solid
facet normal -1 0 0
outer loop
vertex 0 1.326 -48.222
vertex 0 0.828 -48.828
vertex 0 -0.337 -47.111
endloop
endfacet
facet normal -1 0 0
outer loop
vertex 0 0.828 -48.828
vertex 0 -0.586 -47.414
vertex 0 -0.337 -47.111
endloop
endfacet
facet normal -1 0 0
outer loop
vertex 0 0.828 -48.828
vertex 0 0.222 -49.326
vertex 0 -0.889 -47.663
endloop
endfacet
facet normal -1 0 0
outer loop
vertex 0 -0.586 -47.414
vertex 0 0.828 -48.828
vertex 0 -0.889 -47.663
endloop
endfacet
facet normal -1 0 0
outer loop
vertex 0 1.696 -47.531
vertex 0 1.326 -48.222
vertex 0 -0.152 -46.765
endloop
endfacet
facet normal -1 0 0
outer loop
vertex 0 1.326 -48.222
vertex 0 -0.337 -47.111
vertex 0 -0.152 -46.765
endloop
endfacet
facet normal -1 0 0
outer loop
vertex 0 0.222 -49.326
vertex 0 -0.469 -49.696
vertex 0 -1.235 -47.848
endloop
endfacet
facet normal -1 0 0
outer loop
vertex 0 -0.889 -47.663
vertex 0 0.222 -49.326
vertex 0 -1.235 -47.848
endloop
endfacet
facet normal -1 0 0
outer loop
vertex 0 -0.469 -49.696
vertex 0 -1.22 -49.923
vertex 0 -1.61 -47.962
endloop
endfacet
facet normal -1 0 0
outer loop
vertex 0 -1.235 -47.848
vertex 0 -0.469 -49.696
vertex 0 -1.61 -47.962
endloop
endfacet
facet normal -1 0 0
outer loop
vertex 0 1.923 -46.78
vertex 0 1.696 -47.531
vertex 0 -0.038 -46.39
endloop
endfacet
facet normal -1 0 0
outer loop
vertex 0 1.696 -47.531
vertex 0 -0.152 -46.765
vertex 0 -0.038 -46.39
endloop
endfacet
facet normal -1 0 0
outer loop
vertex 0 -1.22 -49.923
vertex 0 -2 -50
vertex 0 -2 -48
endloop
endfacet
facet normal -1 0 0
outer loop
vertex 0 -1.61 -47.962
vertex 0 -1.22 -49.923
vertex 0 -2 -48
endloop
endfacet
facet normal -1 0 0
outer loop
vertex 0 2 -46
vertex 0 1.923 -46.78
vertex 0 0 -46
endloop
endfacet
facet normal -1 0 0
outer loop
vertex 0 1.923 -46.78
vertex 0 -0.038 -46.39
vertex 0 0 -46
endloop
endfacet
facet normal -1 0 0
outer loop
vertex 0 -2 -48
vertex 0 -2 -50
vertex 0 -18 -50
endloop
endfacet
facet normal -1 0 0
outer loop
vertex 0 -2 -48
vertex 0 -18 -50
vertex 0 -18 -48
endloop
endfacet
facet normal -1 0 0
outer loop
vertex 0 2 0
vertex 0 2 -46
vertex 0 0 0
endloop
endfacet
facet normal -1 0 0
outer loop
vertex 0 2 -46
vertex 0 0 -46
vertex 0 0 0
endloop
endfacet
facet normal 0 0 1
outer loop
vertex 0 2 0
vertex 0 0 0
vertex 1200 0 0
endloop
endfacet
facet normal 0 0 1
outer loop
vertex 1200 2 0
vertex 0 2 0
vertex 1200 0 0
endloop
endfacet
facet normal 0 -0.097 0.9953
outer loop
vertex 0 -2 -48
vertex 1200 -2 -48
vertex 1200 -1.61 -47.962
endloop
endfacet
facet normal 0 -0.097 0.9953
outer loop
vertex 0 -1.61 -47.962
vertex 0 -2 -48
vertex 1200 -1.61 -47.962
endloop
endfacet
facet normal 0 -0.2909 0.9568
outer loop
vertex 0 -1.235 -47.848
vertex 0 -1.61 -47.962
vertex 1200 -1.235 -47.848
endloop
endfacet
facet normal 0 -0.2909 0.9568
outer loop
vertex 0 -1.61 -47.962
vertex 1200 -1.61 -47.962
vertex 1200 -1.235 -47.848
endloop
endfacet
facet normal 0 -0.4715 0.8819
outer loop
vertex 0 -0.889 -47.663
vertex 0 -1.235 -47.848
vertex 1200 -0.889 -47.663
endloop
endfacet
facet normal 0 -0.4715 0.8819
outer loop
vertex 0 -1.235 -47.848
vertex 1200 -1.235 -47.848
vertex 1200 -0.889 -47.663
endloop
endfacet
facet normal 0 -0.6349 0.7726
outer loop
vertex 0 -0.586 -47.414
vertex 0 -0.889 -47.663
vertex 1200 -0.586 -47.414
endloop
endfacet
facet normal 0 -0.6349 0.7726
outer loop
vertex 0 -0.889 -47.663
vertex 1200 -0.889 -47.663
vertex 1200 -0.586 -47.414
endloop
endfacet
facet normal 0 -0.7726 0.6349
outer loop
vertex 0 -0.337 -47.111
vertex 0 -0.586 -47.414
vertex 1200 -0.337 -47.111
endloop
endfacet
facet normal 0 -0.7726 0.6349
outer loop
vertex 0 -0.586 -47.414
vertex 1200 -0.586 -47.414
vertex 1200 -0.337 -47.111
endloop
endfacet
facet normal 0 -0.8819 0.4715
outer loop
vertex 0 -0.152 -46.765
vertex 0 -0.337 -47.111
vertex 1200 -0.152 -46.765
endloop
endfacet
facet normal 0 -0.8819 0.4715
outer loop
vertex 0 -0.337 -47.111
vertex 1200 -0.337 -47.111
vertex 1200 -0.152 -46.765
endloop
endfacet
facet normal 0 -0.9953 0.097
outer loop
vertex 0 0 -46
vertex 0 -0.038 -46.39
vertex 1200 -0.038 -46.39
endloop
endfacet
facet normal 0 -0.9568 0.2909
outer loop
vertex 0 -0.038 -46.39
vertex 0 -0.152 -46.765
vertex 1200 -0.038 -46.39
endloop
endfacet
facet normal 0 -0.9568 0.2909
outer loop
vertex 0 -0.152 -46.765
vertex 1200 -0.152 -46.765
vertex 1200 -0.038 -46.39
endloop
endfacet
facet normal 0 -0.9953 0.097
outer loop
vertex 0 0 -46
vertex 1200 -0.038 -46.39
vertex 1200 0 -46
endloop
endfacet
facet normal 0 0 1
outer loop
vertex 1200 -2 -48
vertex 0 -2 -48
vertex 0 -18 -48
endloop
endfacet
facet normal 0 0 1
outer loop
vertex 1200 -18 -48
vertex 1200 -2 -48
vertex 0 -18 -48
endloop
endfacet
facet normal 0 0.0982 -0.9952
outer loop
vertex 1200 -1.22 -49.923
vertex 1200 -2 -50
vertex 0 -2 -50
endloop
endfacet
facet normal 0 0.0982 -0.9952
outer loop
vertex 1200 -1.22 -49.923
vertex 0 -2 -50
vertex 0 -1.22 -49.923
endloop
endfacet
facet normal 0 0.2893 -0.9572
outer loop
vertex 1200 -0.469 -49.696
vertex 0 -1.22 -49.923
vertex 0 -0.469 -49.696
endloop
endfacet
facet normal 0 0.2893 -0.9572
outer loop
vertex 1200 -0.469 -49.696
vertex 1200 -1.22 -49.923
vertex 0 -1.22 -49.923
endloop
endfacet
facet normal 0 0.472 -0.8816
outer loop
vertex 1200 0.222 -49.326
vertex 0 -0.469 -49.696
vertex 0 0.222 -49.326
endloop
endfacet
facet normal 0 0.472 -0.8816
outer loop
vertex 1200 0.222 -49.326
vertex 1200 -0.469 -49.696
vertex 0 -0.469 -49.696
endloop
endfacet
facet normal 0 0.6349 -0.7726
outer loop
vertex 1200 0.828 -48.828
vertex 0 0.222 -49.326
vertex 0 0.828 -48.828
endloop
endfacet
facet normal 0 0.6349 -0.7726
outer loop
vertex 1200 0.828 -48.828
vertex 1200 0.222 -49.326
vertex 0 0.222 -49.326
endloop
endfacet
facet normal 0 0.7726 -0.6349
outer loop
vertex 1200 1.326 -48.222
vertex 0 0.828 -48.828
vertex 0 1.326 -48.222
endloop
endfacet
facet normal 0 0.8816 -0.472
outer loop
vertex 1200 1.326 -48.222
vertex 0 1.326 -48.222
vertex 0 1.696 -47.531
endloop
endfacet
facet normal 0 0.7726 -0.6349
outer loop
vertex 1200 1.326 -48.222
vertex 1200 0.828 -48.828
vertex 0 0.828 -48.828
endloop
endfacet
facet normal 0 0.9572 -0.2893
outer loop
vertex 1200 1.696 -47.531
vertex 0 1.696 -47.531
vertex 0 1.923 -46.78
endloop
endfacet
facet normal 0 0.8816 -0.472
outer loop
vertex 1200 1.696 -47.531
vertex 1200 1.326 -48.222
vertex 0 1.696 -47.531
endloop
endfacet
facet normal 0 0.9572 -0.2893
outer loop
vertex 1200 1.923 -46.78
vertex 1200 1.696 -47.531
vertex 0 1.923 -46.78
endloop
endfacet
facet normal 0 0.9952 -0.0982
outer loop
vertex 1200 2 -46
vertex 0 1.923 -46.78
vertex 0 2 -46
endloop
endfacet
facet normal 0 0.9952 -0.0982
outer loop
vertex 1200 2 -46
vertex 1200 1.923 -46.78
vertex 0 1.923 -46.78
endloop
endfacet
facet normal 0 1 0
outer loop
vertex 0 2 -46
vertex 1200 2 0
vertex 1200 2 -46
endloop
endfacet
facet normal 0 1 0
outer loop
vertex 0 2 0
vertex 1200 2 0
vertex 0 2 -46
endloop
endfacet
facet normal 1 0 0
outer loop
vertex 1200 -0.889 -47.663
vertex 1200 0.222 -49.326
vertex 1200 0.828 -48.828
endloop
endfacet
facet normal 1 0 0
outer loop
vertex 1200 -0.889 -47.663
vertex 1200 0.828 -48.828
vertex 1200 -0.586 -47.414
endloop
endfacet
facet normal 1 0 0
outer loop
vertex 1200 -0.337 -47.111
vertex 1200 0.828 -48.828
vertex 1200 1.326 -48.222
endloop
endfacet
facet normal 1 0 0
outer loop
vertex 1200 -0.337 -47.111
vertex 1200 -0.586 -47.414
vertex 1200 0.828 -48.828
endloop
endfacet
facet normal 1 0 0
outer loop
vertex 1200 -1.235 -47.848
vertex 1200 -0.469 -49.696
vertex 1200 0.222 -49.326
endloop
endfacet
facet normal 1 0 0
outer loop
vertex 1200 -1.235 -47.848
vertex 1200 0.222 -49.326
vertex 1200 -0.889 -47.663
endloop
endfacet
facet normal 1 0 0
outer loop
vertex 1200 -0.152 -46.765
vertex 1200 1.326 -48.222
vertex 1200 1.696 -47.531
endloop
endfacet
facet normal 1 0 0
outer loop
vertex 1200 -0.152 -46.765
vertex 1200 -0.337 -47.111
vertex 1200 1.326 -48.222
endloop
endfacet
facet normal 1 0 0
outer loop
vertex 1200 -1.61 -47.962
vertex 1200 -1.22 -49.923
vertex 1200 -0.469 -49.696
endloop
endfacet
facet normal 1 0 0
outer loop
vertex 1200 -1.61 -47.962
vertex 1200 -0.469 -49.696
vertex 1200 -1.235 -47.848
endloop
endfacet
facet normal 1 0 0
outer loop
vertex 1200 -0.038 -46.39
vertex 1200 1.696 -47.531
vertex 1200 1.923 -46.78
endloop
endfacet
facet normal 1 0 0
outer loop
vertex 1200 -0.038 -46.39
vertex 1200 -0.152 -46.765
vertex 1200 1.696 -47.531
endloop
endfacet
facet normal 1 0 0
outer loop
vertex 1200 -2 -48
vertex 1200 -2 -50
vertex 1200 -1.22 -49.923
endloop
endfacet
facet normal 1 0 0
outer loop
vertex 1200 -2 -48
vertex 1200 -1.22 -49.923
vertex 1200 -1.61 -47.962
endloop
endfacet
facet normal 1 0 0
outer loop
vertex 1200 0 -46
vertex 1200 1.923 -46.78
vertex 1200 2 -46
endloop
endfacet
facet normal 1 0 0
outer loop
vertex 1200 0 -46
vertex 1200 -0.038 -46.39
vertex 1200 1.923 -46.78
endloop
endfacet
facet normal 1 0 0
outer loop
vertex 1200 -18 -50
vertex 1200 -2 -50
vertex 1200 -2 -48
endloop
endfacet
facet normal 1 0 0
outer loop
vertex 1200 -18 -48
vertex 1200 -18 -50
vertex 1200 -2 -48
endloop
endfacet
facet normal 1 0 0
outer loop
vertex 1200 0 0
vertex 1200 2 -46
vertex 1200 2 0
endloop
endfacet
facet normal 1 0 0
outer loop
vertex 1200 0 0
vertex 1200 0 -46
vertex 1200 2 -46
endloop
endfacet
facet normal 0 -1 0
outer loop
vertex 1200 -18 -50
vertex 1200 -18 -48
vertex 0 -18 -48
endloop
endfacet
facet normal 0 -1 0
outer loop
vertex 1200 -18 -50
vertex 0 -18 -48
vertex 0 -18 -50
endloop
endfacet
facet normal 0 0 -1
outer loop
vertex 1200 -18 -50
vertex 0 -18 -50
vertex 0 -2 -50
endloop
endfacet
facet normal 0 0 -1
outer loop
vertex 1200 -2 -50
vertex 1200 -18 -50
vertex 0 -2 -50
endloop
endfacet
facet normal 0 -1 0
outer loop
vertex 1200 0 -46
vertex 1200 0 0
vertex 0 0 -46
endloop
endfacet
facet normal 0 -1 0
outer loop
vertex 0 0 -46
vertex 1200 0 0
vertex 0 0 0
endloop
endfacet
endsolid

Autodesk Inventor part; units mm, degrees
ref_plane "YZ Plane" through (0, 0, 0) normal (1, 0, 0) x (0, 1, 0)
ref_plane "XZ Plane" through (0, 0, 0) normal (0, 1, 0) x (-1, 0, 0)
ref_plane "XY Plane" through (0, 0, 0) normal (0, 0, 1) x (1, 0, 0)
sketch "Sketch3" plane through (0, 0, 0) normal (0, 1, 0) x (-1, 0, 0)
  line L0 (0, 0) -> (-1200, 0)
  line L1 (-1200, 0) -> (-1200, -50)
  line L2 (-1200, -50) -> (0, -50)
  line L3 (0, -50) -> (0, 0)
  dimension "d25" = 50
  dimension "d28" = 1200
extrude "Plate3" add sketch "Sketch3" along normal blind 2
sketch "Sketch4" plane through (1200, 2, -48) normal (0, 0, -1) x (-1, 0, 0)
  line L0 (1200, 0) -> (0, 0)
  line L1 (0, 0) -> (0, -20)
  line L2 (0, -20) -> (1200, -20)
  line L3 (1200, -20) -> (1200, 0)
edge flange "Flange2" height 20 angle 90 thickness 2 bend radius 2 thickness toward (0, 0, -1) relief tear relief width 2 relief depth 1 edges at (600, 0, -50) wall of the first edge with corners at (0, 2, -48) (1200, 2, -48) (1200, -18, -48) (0, -18, -48)
bend "Bend3"
corner "Corner3"
equation "\"d30\" = Thickness"
equation "\"d31\" = BendReliefWidth"
equation "\"d32\" = BendReliefDepth"
equation "\"d33\" = MinimumRemnant"
equation "\"d34\" = TransitionRadius"
equation "\"d37\" = BendRadius"
equation "\"d38\" = CornerReliefSize"
equation "\"d39\" = GapSize"
equation "\"d40\" = JacobiRadiusSize"
equation "\"BendRadius\" = Thickness"
equation "\"BendReliefWidth\" = Thickness"
equation "\"BendReliefDepth\" = 0.5 * Thickness"
equation "\"CornerReliefSize\" = 4 * Thickness"
equation "\"MinimumRemnant\" = 2 * Thickness"
equation "\"TransitionRadius\" = BendRadius"
equation "\"JacobiRadiusSize\" = BendRadius"
equation "\"GapSize\" = Thickness"
equation "\"Thickness\" = 2"
properties part number "GBK-RK-0042 rib 2"
